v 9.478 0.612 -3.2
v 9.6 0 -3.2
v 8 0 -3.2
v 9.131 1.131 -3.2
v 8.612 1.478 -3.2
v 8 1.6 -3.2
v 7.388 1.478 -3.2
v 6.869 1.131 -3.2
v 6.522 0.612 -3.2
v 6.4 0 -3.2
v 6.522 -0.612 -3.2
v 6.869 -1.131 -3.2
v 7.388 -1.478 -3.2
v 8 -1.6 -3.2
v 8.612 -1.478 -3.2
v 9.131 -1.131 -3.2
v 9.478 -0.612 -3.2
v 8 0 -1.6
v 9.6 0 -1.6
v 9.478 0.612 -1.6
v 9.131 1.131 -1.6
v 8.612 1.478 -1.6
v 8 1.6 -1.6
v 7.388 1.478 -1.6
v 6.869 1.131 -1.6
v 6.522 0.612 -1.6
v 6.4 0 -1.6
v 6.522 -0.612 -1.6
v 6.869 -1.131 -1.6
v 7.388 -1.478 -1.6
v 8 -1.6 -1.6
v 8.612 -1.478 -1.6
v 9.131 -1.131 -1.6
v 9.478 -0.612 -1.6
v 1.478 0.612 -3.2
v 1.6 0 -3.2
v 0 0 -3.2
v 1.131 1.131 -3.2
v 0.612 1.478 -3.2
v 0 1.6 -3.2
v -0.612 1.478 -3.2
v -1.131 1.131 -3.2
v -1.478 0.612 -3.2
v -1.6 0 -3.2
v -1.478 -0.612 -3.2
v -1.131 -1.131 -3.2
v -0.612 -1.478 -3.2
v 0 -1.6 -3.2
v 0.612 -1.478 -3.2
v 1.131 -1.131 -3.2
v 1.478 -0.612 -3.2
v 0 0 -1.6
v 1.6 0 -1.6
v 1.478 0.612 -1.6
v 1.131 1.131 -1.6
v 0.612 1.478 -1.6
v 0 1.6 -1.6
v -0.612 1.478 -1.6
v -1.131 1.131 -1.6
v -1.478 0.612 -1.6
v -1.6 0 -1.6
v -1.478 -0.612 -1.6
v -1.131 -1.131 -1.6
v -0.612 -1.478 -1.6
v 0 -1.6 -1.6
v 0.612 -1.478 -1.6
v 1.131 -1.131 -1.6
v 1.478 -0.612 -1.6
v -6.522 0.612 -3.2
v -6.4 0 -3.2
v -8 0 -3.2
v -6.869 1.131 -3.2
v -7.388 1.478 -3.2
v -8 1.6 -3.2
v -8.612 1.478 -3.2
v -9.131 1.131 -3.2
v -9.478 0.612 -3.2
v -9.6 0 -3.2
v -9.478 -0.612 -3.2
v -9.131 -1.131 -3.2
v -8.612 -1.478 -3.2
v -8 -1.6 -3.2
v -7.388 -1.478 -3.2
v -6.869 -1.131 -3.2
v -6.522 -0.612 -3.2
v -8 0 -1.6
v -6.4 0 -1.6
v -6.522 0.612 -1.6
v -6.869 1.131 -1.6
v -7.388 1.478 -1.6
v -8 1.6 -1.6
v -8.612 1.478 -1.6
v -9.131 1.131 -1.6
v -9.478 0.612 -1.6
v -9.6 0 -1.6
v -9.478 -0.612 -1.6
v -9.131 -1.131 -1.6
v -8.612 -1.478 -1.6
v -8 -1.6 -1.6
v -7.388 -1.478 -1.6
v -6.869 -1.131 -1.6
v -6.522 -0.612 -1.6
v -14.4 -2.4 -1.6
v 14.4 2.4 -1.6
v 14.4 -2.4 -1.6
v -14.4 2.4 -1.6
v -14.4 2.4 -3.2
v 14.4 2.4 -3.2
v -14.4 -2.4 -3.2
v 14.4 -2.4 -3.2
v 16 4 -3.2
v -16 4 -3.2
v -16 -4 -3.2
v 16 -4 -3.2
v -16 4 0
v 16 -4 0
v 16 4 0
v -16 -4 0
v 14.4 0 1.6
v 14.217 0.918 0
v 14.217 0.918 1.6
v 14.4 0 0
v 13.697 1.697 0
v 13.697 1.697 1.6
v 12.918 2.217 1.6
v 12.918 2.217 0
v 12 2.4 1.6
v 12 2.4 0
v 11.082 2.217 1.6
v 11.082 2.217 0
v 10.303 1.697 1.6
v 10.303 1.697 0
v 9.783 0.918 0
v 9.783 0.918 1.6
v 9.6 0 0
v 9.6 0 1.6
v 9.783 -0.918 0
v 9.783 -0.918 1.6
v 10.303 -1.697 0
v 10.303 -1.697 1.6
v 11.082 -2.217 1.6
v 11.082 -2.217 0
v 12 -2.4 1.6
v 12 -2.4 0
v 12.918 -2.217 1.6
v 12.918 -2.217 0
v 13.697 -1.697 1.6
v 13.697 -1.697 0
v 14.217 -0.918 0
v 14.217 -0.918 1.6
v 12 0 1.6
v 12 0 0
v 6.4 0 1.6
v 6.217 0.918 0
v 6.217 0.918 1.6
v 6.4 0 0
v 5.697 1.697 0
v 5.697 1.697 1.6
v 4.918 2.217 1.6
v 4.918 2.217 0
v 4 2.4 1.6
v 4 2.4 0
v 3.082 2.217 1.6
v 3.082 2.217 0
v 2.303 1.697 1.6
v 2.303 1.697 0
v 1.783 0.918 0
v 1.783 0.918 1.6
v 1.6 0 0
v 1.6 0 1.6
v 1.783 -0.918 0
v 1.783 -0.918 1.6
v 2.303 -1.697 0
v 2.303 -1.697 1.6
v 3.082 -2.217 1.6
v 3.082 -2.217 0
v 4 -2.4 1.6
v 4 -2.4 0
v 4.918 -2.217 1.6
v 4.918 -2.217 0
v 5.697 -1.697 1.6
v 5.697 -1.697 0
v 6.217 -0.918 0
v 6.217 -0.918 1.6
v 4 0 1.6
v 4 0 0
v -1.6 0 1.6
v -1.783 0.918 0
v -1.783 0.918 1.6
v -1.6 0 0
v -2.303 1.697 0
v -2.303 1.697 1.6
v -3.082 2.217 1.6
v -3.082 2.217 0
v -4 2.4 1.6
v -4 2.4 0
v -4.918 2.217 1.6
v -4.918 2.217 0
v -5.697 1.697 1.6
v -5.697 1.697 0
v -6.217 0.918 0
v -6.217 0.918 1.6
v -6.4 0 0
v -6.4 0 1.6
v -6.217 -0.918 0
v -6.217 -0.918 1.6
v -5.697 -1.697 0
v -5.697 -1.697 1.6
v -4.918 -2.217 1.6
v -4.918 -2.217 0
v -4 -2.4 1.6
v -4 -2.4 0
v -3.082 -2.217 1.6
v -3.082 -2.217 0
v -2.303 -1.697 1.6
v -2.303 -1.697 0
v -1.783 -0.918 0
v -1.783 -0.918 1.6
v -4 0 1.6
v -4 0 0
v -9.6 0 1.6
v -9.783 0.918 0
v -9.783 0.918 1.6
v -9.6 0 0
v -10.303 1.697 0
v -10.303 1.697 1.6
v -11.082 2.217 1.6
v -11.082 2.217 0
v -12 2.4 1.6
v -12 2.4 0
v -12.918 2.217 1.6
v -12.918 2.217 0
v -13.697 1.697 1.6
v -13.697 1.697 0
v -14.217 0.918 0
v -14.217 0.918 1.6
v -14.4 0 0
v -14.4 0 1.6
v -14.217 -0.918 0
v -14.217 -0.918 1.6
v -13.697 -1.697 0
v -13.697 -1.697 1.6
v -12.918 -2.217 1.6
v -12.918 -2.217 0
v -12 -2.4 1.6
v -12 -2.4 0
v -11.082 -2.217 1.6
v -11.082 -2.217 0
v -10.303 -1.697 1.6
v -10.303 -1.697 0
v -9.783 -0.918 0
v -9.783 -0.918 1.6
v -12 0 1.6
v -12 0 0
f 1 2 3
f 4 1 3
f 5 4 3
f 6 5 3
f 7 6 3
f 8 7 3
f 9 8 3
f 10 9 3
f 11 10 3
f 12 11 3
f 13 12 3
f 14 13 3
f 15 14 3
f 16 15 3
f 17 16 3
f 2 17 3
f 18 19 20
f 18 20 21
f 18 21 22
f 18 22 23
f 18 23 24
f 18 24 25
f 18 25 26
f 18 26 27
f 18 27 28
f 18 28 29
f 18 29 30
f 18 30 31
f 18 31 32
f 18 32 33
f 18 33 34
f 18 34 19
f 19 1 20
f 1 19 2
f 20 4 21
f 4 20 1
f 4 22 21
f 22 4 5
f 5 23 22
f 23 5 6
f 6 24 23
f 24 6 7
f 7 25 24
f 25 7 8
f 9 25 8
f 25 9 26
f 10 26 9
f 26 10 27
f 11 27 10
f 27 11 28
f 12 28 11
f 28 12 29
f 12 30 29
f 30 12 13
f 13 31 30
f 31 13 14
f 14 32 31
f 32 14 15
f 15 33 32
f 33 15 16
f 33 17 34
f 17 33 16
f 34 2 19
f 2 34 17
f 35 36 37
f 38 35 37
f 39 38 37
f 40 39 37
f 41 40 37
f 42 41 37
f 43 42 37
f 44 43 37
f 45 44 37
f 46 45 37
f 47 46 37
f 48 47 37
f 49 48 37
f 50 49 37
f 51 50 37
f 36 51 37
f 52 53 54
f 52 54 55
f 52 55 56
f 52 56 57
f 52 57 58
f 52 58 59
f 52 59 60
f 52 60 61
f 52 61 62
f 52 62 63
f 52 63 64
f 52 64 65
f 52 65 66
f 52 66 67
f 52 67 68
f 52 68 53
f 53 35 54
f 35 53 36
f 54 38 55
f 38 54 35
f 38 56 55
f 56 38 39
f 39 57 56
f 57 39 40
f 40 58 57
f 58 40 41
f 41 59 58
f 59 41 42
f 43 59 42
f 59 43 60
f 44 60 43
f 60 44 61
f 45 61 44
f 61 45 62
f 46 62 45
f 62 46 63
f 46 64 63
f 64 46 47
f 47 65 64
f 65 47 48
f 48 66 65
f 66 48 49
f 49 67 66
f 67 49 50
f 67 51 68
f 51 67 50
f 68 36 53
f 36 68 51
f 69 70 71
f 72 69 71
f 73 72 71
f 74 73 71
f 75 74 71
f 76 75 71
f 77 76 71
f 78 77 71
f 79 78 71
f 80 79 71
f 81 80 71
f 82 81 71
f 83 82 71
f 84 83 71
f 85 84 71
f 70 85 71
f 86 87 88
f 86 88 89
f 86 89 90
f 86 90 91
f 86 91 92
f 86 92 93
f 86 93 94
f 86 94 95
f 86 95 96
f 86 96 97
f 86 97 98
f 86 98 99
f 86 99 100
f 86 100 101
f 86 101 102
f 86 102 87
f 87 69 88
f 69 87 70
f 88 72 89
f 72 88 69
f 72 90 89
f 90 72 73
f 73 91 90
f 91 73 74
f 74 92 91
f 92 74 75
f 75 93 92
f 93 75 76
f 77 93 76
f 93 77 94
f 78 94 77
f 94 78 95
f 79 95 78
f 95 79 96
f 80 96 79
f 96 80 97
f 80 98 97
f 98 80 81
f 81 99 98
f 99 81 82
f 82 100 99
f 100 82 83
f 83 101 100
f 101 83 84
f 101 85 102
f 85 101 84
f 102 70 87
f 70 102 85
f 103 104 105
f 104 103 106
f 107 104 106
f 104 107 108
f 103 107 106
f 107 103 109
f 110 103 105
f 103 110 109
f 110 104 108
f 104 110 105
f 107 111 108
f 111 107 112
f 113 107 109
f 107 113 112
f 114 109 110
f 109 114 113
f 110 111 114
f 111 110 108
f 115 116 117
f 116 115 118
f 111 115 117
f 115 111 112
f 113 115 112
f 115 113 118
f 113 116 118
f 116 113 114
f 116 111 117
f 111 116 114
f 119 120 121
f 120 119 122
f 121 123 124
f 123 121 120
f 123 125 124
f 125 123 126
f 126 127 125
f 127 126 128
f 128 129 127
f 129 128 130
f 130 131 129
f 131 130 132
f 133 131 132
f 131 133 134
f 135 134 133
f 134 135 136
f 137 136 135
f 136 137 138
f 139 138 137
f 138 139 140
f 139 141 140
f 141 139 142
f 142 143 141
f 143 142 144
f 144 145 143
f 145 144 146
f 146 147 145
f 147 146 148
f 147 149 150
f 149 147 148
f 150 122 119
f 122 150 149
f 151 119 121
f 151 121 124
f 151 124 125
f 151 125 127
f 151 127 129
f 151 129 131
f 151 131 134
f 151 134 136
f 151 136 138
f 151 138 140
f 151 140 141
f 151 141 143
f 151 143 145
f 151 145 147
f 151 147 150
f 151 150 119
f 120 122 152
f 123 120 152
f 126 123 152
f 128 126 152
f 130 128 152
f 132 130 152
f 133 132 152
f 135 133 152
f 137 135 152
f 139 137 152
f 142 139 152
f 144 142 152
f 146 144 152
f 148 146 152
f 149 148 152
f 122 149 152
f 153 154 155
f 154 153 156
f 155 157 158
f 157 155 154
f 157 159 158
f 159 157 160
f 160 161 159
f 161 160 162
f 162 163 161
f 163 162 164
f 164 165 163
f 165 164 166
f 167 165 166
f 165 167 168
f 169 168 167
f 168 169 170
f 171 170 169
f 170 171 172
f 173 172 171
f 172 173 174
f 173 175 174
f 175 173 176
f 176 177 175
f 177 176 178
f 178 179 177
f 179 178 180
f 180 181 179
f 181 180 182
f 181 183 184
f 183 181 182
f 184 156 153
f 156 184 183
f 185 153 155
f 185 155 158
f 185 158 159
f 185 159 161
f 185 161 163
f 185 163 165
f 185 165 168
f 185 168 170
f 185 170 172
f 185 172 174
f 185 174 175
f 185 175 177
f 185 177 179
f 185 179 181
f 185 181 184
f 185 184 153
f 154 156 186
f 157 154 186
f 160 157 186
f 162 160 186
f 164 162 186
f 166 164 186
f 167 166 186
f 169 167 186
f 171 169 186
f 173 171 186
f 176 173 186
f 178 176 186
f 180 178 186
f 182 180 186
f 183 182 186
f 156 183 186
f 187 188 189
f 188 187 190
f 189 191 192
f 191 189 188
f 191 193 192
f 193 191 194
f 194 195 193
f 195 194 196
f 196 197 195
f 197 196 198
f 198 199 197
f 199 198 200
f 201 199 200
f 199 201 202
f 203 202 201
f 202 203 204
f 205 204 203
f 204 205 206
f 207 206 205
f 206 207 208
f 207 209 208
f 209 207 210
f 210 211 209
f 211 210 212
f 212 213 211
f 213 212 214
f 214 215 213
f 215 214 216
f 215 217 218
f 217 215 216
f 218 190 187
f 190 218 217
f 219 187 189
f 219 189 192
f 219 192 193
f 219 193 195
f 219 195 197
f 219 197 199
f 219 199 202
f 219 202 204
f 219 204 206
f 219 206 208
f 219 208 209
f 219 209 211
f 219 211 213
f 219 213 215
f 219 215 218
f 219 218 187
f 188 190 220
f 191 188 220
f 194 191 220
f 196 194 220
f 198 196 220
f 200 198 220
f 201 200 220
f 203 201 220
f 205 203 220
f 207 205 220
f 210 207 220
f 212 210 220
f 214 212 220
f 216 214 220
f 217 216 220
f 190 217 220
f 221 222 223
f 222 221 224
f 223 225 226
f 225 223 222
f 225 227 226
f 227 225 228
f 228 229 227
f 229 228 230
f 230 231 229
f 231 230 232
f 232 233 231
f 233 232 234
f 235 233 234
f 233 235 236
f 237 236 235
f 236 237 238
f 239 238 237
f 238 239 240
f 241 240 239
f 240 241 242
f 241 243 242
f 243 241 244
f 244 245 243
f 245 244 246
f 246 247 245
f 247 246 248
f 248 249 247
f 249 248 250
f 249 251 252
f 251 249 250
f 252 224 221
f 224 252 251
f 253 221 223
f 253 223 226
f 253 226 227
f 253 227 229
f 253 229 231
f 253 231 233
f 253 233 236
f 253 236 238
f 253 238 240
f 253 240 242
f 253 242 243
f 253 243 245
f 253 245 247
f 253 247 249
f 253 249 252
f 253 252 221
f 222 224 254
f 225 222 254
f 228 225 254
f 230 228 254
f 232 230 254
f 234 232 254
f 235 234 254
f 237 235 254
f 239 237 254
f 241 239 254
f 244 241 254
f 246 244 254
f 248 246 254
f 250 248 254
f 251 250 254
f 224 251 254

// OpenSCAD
// file: ../p/4-4edge.scad
use <../lib.scad>
function ldraw_lib__4_4edge() = [
// 0 Circle 1.0
// 0 Name: 4-4edge.dat
// 0 Author: James Jessiman
// 0 !LDRAW_ORG Primitive UPDATE 2017-01
// 0 !LICENSE Licensed under CC BY 2.0 and CC BY 4.0 : see CAreadme.txt
// 
// 0 BFC CERTIFY CCW
  [0,"BFC","CERTIFY"],
  [0,"BFC","CCW"],
// 
// 0 !HISTORY 1998-12-15 [PTadmin] Official Update 1998-10
// 0 !HISTORY 2005-12-28 [PTadmin] Official Update 2005-01
// 0 !HISTORY 2007-06-24 [PTadmin] Header formatted for Contributor Agreement
// 0 !HISTORY 2008-07-01 [PTadmin] Official Update 2008-01
// 0 !HISTORY 2017-01-15 [Steffen] BFCed
// 0 !HISTORY 2017-12-30 [PTadmin] Official Update 2017-01
// 
// 
// 2 24 1 0 0 0.9239 0 0.3827
  [2,24,1,0,0,0.9239,0,0.3827],
// 2 24 0.9239 0 0.3827 0.7071 0 0.7071
  [2,24,0.9239,0,0.3827,0.7071,0,0.7071],
// 2 24 0.7071 0 0.7071 0.3827 0 0.9239
  [2,24,0.7071,0,0.7071,0.3827,0,0.9239],
// 2 24 0.3827 0 0.9239 0 0 1
  [2,24,0.3827,0,0.9239,0,0,1],
// 2 24 0 0 1 -0.3827 0 0.9239
  [2,24,0,0,1,-0.3827,0,0.9239],
// 2 24 -0.3827 0 0.9239 -0.7071 0 0.7071
  [2,24,-0.3827,0,0.9239,-0.7071,0,0.7071],
// 2 24 -0.7071 0 0.7071 -0.9239 0 0.3827
  [2,24,-0.7071,0,0.7071,-0.9239,0,0.3827],
// 2 24 -0.9239 0 0.3827 -1 0 -0
  [2,24,-0.9239,0,0.3827,-1,0,-0],
// 2 24 -1 0 -0 -0.9239 0 -0.3827
  [2,24,-1,0,-0,-0.9239,0,-0.3827],
// 2 24 -0.9239 0 -0.3827 -0.7071 0 -0.7071
  [2,24,-0.9239,0,-0.3827,-0.7071,0,-0.7071],
// 2 24 -0.7071 0 -0.7071 -0.3827 0 -0.9239
  [2,24,-0.7071,0,-0.7071,-0.3827,0,-0.9239],
// 2 24 -0.3827 0 -0.9239 0 0 -1
  [2,24,-0.3827,0,-0.9239,0,0,-1],
// 2 24 0 0 -1 0.3827 0 -0.9239
  [2,24,0,0,-1,0.3827,0,-0.9239],
// 2 24 0.3827 0 -0.9239 0.7071 0 -0.7071
  [2,24,0.3827,0,-0.9239,0.7071,0,-0.7071],
// 2 24 0.7071 0 -0.7071 0.9239 0 -0.3827
  [2,24,0.7071,0,-0.7071,0.9239,0,-0.3827],
// 2 24 0.9239 0 -0.3827 1 0 0
  [2,24,0.9239,0,-0.3827,1,0,0],
];
module ldraw_lib__4_4edge(step=0, col=false, unit=2/5, alt=false, line=0.2, solid=!$preview)
    makepoly(ldraw_lib__4_4edge(), step=step, col=col, unit=unit, alt=alt, line=line, solid=solid);
ldraw_lib__4_4edge(line=0.2);
// file: ../p/4-4disc.scad
use <../lib.scad>
function ldraw_lib__4_4disc() = [
// 0 Disc 1.0
// 0 Name: 4-4disc.dat
// 0 Author: James Jessiman
// 0 !LDRAW_ORG Primitive UPDATE 2002-02
// 0 !LICENSE Licensed under CC BY 2.0 and CC BY 4.0 : see CAreadme.txt
// 
// 0 BFC CERTIFY CCW
  [0,"BFC","CERTIFY"],
  [0,"BFC","CCW"],
// 
// 0 !HISTORY 1998-12-15 [PTadmin] Official Update 1998-10
// 0 !HISTORY 2002-03-23 [sbliss] Added BFC statement
// 0 !HISTORY 2002-04-25 [PTadmin] Official Update 2002-02
// 0 !HISTORY 2007-06-24 [PTadmin] Header formatted for Contributor Agreement
// 0 !HISTORY 2008-07-01 [PTadmin] Official Update 2008-01
// 
// 
// 3 16 0 0 0 1 0 0 0.9239 0 0.3827
  [3,16,0,0,0,1,0,0,0.9239,0,0.3827],
// 3 16 0 0 0 0.9239 0 0.3827 0.7071 0 0.7071
  [3,16,0,0,0,0.9239,0,0.3827,0.7071,0,0.7071],
// 3 16 0 0 0 0.7071 0 0.7071 0.3827 0 0.9239
  [3,16,0,0,0,0.7071,0,0.7071,0.3827,0,0.9239],
// 3 16 0 0 0 0.3827 0 0.9239 0 0 1
  [3,16,0,0,0,0.3827,0,0.9239,0,0,1],
// 3 16 0 0 0 0 0 1 -0.3827 0 0.9239
  [3,16,0,0,0,0,0,1,-0.3827,0,0.9239],
// 3 16 0 0 0 -0.3827 0 0.9239 -0.7071 0 0.7071
  [3,16,0,0,0,-0.3827,0,0.9239,-0.7071,0,0.7071],
// 3 16 0 0 0 -0.7071 0 0.7071 -0.9239 0 0.3827
  [3,16,0,0,0,-0.7071,0,0.7071,-0.9239,0,0.3827],
// 3 16 0 0 0 -0.9239 0 0.3827 -1 0 -0
  [3,16,0,0,0,-0.9239,0,0.3827,-1,0,-0],
// 3 16 0 0 0 -1 0 -0 -0.9239 0 -0.3827
  [3,16,0,0,0,-1,0,-0,-0.9239,0,-0.3827],
// 3 16 0 0 0 -0.9239 0 -0.3827 -0.7071 0 -0.7071
  [3,16,0,0,0,-0.9239,0,-0.3827,-0.7071,0,-0.7071],
// 3 16 0 0 0 -0.7071 0 -0.7071 -0.3827 0 -0.9239
  [3,16,0,0,0,-0.7071,0,-0.7071,-0.3827,0,-0.9239],
// 3 16 0 0 0 -0.3827 0 -0.9239 0 0 -1
  [3,16,0,0,0,-0.3827,0,-0.9239,0,0,-1],
// 3 16 0 0 0 0 0 -1 0.3827 0 -0.9239
  [3,16,0,0,0,0,0,-1,0.3827,0,-0.9239],
// 3 16 0 0 0 0.3827 0 -0.9239 0.7071 0 -0.7071
  [3,16,0,0,0,0.3827,0,-0.9239,0.7071,0,-0.7071],
// 3 16 0 0 0 0.7071 0 -0.7071 0.9239 0 -0.3827
  [3,16,0,0,0,0.7071,0,-0.7071,0.9239,0,-0.3827],
// 3 16 0 0 0 0.9239 0 -0.3827 1 0 0
  [3,16,0,0,0,0.9239,0,-0.3827,1,0,0],
// 0
];
module ldraw_lib__4_4disc(step=0, col=false, unit=2/5, alt=false, line=0.2, solid=!$preview)
    makepoly(ldraw_lib__4_4disc(), step=step, col=col, unit=unit, alt=alt, line=line, solid=solid);
ldraw_lib__4_4disc(line=0.2);
// file: ../p/4-4cyli.scad
use <../lib.scad>
function ldraw_lib__4_4cyli() = [
// 0 Cylinder 1.0
// 0 Name: 4-4cyli.dat
// 0 Author: James Jessiman
// 0 !LDRAW_ORG Primitive UPDATE 2005-01
// 0 !LICENSE Licensed under CC BY 4.0 : see CAreadme.txt
// 
// 0 BFC CERTIFY CCW
  [0,"BFC","CERTIFY"],
  [0,"BFC","CCW"],
// 
// 0 !HISTORY 1998-12-15 [PTadmin] Official Update 1998-10
// 0 !HISTORY 2002-03-23 [sbliss] Added BFC statement; merged headers from files in distributions LDraw 0.27 and Complete.
// 0 !HISTORY 2002-04-25 [PTadmin] Official Update 2002-02
// 0 !HISTORY 2004-12-14 [guyvivan] BFC CCW
// 0 !HISTORY 2005-12-28 [PTadmin] Official Update 2005-01
// 0 !HISTORY 2007-06-24 [PTadmin] Header formatted for Contributor Agreement
// 0 !HISTORY 2008-07-01 [PTadmin] Official Update 2008-01
// 
// 
// 4 16 1 1 0 0.9239 1 0.3827 0.9239 0 0.3827 1 0 0
  [4,16,1,1,0,0.9239,1,0.3827,0.9239,0,0.3827,1,0,0],
// 5 24 1 0 0 1 1 0 0.9239 0 0.3827 0.9239 0 -0.3827
  [5,24,1,0,0,1,1,0,0.9239,0,0.3827,0.9239,0,-0.3827],
// 4 16 0.9239 1 0.3827 0.7071 1 0.7071 0.7071 0 0.7071 0.9239 0 0.3827
  [4,16,0.9239,1,0.3827,0.7071,1,0.7071,0.7071,0,0.7071,0.9239,0,0.3827],
// 5 24 0.9239 0 0.3827 0.9239 1 0.3827 0.7071 0 0.7071 1 0 0
  [5,24,0.9239,0,0.3827,0.9239,1,0.3827,0.7071,0,0.7071,1,0,0],
// 4 16 0.7071 1 0.7071 0.3827 1 0.9239 0.3827 0 0.9239 0.7071 0 0.7071
  [4,16,0.7071,1,0.7071,0.3827,1,0.9239,0.3827,0,0.9239,0.7071,0,0.7071],
// 5 24 0.7071 0 0.7071 0.7071 1 0.7071 0.3827 0 0.9239 0.9239 0 0.3827
  [5,24,0.7071,0,0.7071,0.7071,1,0.7071,0.3827,0,0.9239,0.9239,0,0.3827],
// 4 16 0.3827 1 0.9239 0 1 1 0 0 1 0.3827 0 0.9239
  [4,16,0.3827,1,0.9239,0,1,1,0,0,1,0.3827,0,0.9239],
// 5 24 0.3827 0 0.9239 0.3827 1 0.9239 0 0 1 0.7071 0 0.7071
  [5,24,0.3827,0,0.9239,0.3827,1,0.9239,0,0,1,0.7071,0,0.7071],
// 4 16 0 1 1 -0.3827 1 0.9239 -0.3827 0 0.9239 0 0 1
  [4,16,0,1,1,-0.3827,1,0.9239,-0.3827,0,0.9239,0,0,1],
// 5 24 0 0 1 0 1 1 -0.3827 0 0.9239 0.3827 0 0.9239
  [5,24,0,0,1,0,1,1,-0.3827,0,0.9239,0.3827,0,0.9239],
// 4 16 -0.3827 1 0.9239 -0.7071 1 0.7071 -0.7071 0 0.7071 -0.3827 0 0.9239
  [4,16,-0.3827,1,0.9239,-0.7071,1,0.7071,-0.7071,0,0.7071,-0.3827,0,0.9239],
// 5 24 -0.3827 0 0.9239 -0.3827 1 0.9239 -0.7071 0 0.7071 0 0 1
  [5,24,-0.3827,0,0.9239,-0.3827,1,0.9239,-0.7071,0,0.7071,0,0,1],
// 4 16 -0.7071 1 0.7071 -0.9239 1 0.3827 -0.9239 0 0.3827 -0.7071 0 0.7071
  [4,16,-0.7071,1,0.7071,-0.9239,1,0.3827,-0.9239,0,0.3827,-0.7071,0,0.7071],
// 5 24 -0.7071 0 0.7071 -0.7071 1 0.7071 -0.9239 0 0.3827 -0.3827 0 0.9239
  [5,24,-0.7071,0,0.7071,-0.7071,1,0.7071,-0.9239,0,0.3827,-0.3827,0,0.9239],
// 4 16 -0.9239 1 0.3827 -1 1 0 -1 0 0 -0.9239 0 0.3827
  [4,16,-0.9239,1,0.3827,-1,1,0,-1,0,0,-0.9239,0,0.3827],
// 5 24 -0.9239 0 0.3827 -0.9239 1 0.3827 -1 0 0 -0.7071 0 0.7071
  [5,24,-0.9239,0,0.3827,-0.9239,1,0.3827,-1,0,0,-0.7071,0,0.7071],
// 4 16 -1 1 0 -0.9239 1 -0.3827 -0.9239 0 -0.3827 -1 0 0
  [4,16,-1,1,0,-0.9239,1,-0.3827,-0.9239,0,-0.3827,-1,0,0],
// 5 24 -1 0 0 -1 1 0 -0.9239 0 -0.3827 -0.9239 0 0.3827
  [5,24,-1,0,0,-1,1,0,-0.9239,0,-0.3827,-0.9239,0,0.3827],
// 4 16 -0.9239 1 -0.3827 -0.7071 1 -0.7071 -0.7071 0 -0.7071 -0.9239 0 -0.3827
  [4,16,-0.9239,1,-0.3827,-0.7071,1,-0.7071,-0.7071,0,-0.7071,-0.9239,0,-0.3827],
// 5 24 -0.9239 0 -0.3827 -0.9239 1 -0.3827 -0.7071 0 -0.7071 -1 0 0
  [5,24,-0.9239,0,-0.3827,-0.9239,1,-0.3827,-0.7071,0,-0.7071,-1,0,0],
// 4 16 -0.7071 1 -0.7071 -0.3827 1 -0.9239 -0.3827 0 -0.9239 -0.7071 0 -0.7071
  [4,16,-0.7071,1,-0.7071,-0.3827,1,-0.9239,-0.3827,0,-0.9239,-0.7071,0,-0.7071],
// 5 24 -0.7071 0 -0.7071 -0.7071 1 -0.7071 -0.3827 0 -0.9239 -0.9239 0 -0.3827
  [5,24,-0.7071,0,-0.7071,-0.7071,1,-0.7071,-0.3827,0,-0.9239,-0.9239,0,-0.3827],
// 4 16 -0.3827 1 -0.9239 0 1 -1 0 0 -1 -0.3827 0 -0.9239
  [4,16,-0.3827,1,-0.9239,0,1,-1,0,0,-1,-0.3827,0,-0.9239],
// 5 24 -0.3827 0 -0.9239 -0.3827 1 -0.9239 0 0 -1 -0.7071 0 -0.7071
  [5,24,-0.3827,0,-0.9239,-0.3827,1,-0.9239,0,0,-1,-0.7071,0,-0.7071],
// 4 16 0 1 -1 0.3827 1 -0.9239 0.3827 0 -0.9239 0 0 -1
  [4,16,0,1,-1,0.3827,1,-0.9239,0.3827,0,-0.9239,0,0,-1],
// 5 24 0 0 -1 0 1 -1 0.3827 0 -0.9239 -0.3827 0 -0.9239
  [5,24,0,0,-1,0,1,-1,0.3827,0,-0.9239,-0.3827,0,-0.9239],
// 4 16 0.3827 1 -0.9239 0.7071 1 -0.7071 0.7071 0 -0.7071 0.3827 0 -0.9239
  [4,16,0.3827,1,-0.9239,0.7071,1,-0.7071,0.7071,0,-0.7071,0.3827,0,-0.9239],
// 5 24 0.3827 0 -0.9239 0.3827 1 -0.9239 0.7071 0 -0.7071 0 0 -1
  [5,24,0.3827,0,-0.9239,0.3827,1,-0.9239,0.7071,0,-0.7071,0,0,-1],
// 4 16 0.7071 1 -0.7071 0.9239 1 -0.3827 0.9239 0 -0.3827 0.7071 0 -0.7071
  [4,16,0.7071,1,-0.7071,0.9239,1,-0.3827,0.9239,0,-0.3827,0.7071,0,-0.7071],
// 5 24 0.7071 0 -0.7071 0.7071 1 -0.7071 0.9239 0 -0.3827 0.3827 0 -0.9239
  [5,24,0.7071,0,-0.7071,0.7071,1,-0.7071,0.9239,0,-0.3827,0.3827,0,-0.9239],
// 4 16 0.9239 1 -0.3827 1 1 0 1 0 0 0.9239 0 -0.3827
  [4,16,0.9239,1,-0.3827,1,1,0,1,0,0,0.9239,0,-0.3827],
// 5 24 0.9239 0 -0.3827 0.9239 1 -0.3827 1 0 0 0.7071 0 -0.7071
  [5,24,0.9239,0,-0.3827,0.9239,1,-0.3827,1,0,0,0.7071,0,-0.7071],
// 0
];
module ldraw_lib__4_4cyli(step=0, col=false, unit=2/5, alt=false, line=0.2, solid=!$preview)
    makepoly(ldraw_lib__4_4cyli(), step=step, col=col, unit=unit, alt=alt, line=line, solid=solid);
ldraw_lib__4_4cyli(line=0.2);
// file: ../p/stud3.scad
use <../lib.scad>
use <4-4cyli.scad>
use <4-4disc.scad>
use <4-4edge.scad>
function ldraw_lib__stud3() = [
// 0 Stud Tube Solid
// 0 Name: stud3.dat
// 0 Author: James Jessiman
// 0 !LDRAW_ORG Primitive UPDATE 2012-01
// 0 !LICENSE Licensed under CC BY 4.0 : see CAreadme.txt
// 
// 0 BFC CERTIFY CCW
  [0,"BFC","CERTIFY"],
  [0,"BFC","CCW"],
// 
// 0 !HISTORY 2002-04-04 [sbliss] Modified for BFC compliance
// 0 !HISTORY 2002-04-25 [PTadmin] Official Update 2002-02
// 0 !HISTORY 2007-06-24 [PTadmin] Header formatted for Contributor Agreement
// 0 !HISTORY 2008-07-01 [PTadmin] Official Update 2008-01
// 0 !HISTORY 2012-02-16 [Philo] Changed to CCW
// 0 !HISTORY 2012-03-30 [PTadmin] Official Update 2012-01
// 
// 
// 1 16 0 -4 0 4 0 0 0 1 0 0 0 4 4-4edge.dat
  [1,16,0,-4,0,4,0,0,0,1,0,0,0,4, ldraw_lib__4_4edge()],
// 1 16 0 0 0 4 0 0 0 1 0 0 0 4 4-4edge.dat
  [1,16,0,0,0,4,0,0,0,1,0,0,0,4, ldraw_lib__4_4edge()],
// 1 16 0 -4 0 4 0 0 0 1 0 0 0 4 4-4disc.dat
  [1,16,0,-4,0,4,0,0,0,1,0,0,0,4, ldraw_lib__4_4disc()],
  [-1,16,0,0,0,4,0,0,0,-1,0,0,0,4, ldraw_lib__4_4disc()],
// 1 16 0 -4 0 4 0 0 0 4 0 0 0 4 4-4cyli.dat
  [1,16,0,-4,0,4,0,0,0,4,0,0,0,4, ldraw_lib__4_4cyli()],
];
module ldraw_lib__stud3(step=0, col=false, unit=2/5, alt=false, line=0.2, solid=!$preview)
    makepoly(ldraw_lib__stud3(), step=step, col=col, unit=unit, alt=alt, line=line, solid=solid);
ldraw_lib__stud3(line=0.2);
// file: ../p/stud.scad
use <../lib.scad>
use <4-4cyli.scad>
use <4-4disc.scad>
use <4-4edge.scad>
function ldraw_lib__stud() = [
// 0 Stud
// 0 Name: stud.dat
// 0 Author: James Jessiman
// 0 !LDRAW_ORG Primitive UPDATE 2012-01
// 0 !LICENSE Licensed under CC BY 4.0 : see CAreadme.txt
// 
// 0 BFC CERTIFY CCW
  [0,"BFC","CERTIFY"],
  [0,"BFC","CCW"],
// 
// 0 !HISTORY 2002-04-04 [sbliss] Modified for BFC compliance
// 0 !HISTORY 2002-04-25 [PTadmin] Official Update 2002-02
// 0 !HISTORY 2007-06-24 [PTadmin] Header formatted for Contributor Agreement
// 0 !HISTORY 2008-07-01 [PTadmin] Official Update 2008-01
// 0 !HISTORY 2012-02-16 [Philo] Changed to CCW
// 0 !HISTORY 2012-03-30 [PTadmin] Official Update 2012-01
// 
// 
// 1 16 0 0 0 6 0 0 0 1 0 0 0 6 4-4edge.dat
  [1,16,0,0,0,6,0,0,0,1,0,0,0,6, ldraw_lib__4_4edge()],
// 1 16 0 -4 0 6 0 0 0 1 0 0 0 6 4-4edge.dat
  [1,16,0,-4,0,6,0,0,0,1,0,0,0,6, ldraw_lib__4_4edge()],
// 1 16 0 0 0 6 0 0 0 -4 0 0 0 6 4-4cyli.dat
  [1,16,0,0,0,6,0,0,0,-4,0,0,0,6, ldraw_lib__4_4cyli()],
// 1 16 0 -4 0 6 0 0 0 1 0 0 0 6 4-4disc.dat
  [1,16,0,-4,0,6,0,0,0,1,0,0,0,6, ldraw_lib__4_4disc()],
  [-1,16,0,0,0,6,0,0,0,-1,0,0,0,6, ldraw_lib__4_4disc()],
];
module ldraw_lib__stud(step=0, col=false, unit=2/5, alt=false, line=0.2, solid=!$preview)
    makepoly(ldraw_lib__stud(), step=step, col=col, unit=unit, alt=alt, line=line, solid=solid);
ldraw_lib__stud(line=0.2);
// file: ../p/box5.scad
use <../lib.scad>
function ldraw_lib__box5() = [
// 0 Box with 5 Faces and All Edges
// 0 Name: box5.dat
// 0 Author: James Jessiman
// 0 !LDRAW_ORG Primitive UPDATE 2012-01
// 0 !LICENSE Licensed under CC BY 2.0 and CC BY 4.0 : see CAreadme.txt
// 
// 0 BFC CERTIFY CCW
  [0,"BFC","CERTIFY"],
  [0,"BFC","CCW"],
// 
// 0 !HISTORY 2002-04-03 [sbliss] Modified for BFC compliance
// 0 !HISTORY 2002-04-25 [PTadmin] Official Update 2002-02
// 0 !HISTORY 2007-06-24 [PTadmin] Header formatted for Contributor Agreement
// 0 !HISTORY 2008-07-01 [PTadmin] Official Update 2008-01
// 0 !HISTORY 2012-02-16 [Philo] Changed to CCW
// 0 !HISTORY 2012-03-30 [PTadmin] Official Update 2012-01
// 
// 
// 2 24 1 1 1 -1 1 1
  [2,24,1,1,1,-1,1,1],
// 2 24 -1 1 1 -1 1 -1
  [2,24,-1,1,1,-1,1,-1],
// 2 24 -1 1 -1 1 1 -1
  [2,24,-1,1,-1,1,1,-1],
// 2 24 1 1 -1 1 1 1
  [2,24,1,1,-1,1,1,1],
// 2 24 1 0 1 -1 0 1
  [2,24,1,0,1,-1,0,1],
// 2 24 -1 0 1 -1 0 -1
  [2,24,-1,0,1,-1,0,-1],
// 2 24 -1 0 -1 1 0 -1
  [2,24,-1,0,-1,1,0,-1],
// 2 24 1 0 -1 1 0 1
  [2,24,1,0,-1,1,0,1],
// 2 24 1 0 1 1 1 1
  [2,24,1,0,1,1,1,1],
// 2 24 -1 0 1 -1 1 1
  [2,24,-1,0,1,-1,1,1],
// 2 24 1 0 -1 1 1 -1
  [2,24,1,0,-1,1,1,-1],
// 2 24 -1 0 -1 -1 1 -1
  [2,24,-1,0,-1,-1,1,-1],
// 4 16 -1 1 1 1 1 1 1 1 -1 -1 1 -1
  [4,16,-1,1,1,1,1,1,1,1,-1,-1,1,-1],
// 4 16 -1 1 1 -1 0 1 1 0 1 1 1 1
  [4,16,-1,1,1,-1,0,1,1,0,1,1,1,1],
// 4 16 -1 1 -1 -1 0 -1 -1 0 1 -1 1 1
  [4,16,-1,1,-1,-1,0,-1,-1,0,1,-1,1,1],
// 4 16 1 1 -1 1 0 -1 -1 0 -1 -1 1 -1
  [4,16,1,1,-1,1,0,-1,-1,0,-1,-1,1,-1],
// 4 16 1 1 1 1 0 1 1 0 -1 1 1 -1
  [4,16,1,1,1,1,0,1,1,0,-1,1,1,-1],
];
makepoly(ldraw_lib__box5(), line=0.2);
// main file
use <../lib.scad>
use <../p/box5.scad>
use <../p/stud.scad>
use <../p/stud3.scad>
function ldraw_lib__3710() = [
// 0 Plate  1 x  4
// 0 Name: 3710.dat
// 0 Author: James Jessiman
// 0 !LDRAW_ORG Part UPDATE 2004-04
// 0 !LICENSE Licensed under CC BY 4.0 : see CAreadme.txt
// 
// 0 BFC CERTIFY CCW
  [0,"BFC","CERTIFY"],
  [0,"BFC","CCW"],
// 
// 0 !HISTORY 2004-07-25 [guyvivan] Made BFC Compliant
// 0 !HISTORY 2004-11-06 [PTadmin] Official Update 2004-04
// 0 !HISTORY 2007-06-29 [PTadmin] Header formatted for Contributor Agreement
// 0 !HISTORY 2008-07-01 [PTadmin] Official Update 2008-01
// 
// 
// 1 16 20 4 0 1 0 0 0 -1 0 0 0 1 stud3.dat
  [1,16,20,4,0,1,0,0,0,-1,0,0,0,1, ldraw_lib__stud3()],
// 1 16 0 4 0 1 0 0 0 -1 0 0 0 1 stud3.dat
  [1,16,0,4,0,1,0,0,0,-1,0,0,0,1, ldraw_lib__stud3()],
// 1 16 -20 4 0 1 0 0 0 -1 0 0 0 1 stud3.dat
  [1,16,-20,4,0,1,0,0,0,-1,0,0,0,1, ldraw_lib__stud3()],
// 0 BFC INVERTNEXT
  [0,"BFC","INVERTNEXT"],
// 1 16 0 8 0 36 0 0 0 -4 0 0 0 6 box5.dat
  [1,16,0,8,0,36,0,0,0,-4,0,0,0,6, ldraw_lib__box5()],
// 4 16 40 8 10 36 8 6 -36 8 6 -40 8 10
  [4,16,40,8,10,36,8,6,-36,8,6,-40,8,10],
// 4 16 -40 8 10 -36 8 6 -36 8 -6 -40 8 -10
  [4,16,-40,8,10,-36,8,6,-36,8,-6,-40,8,-10],
// 4 16 -40 8 -10 -36 8 -6 36 8 -6 40 8 -10
  [4,16,-40,8,-10,-36,8,-6,36,8,-6,40,8,-10],
// 4 16 40 8 -10 36 8 -6 36 8 6 40 8 10
  [4,16,40,8,-10,36,8,-6,36,8,6,40,8,10],
// 1 16 0 8 0 40 0 0 0 -8 0 0 0 10 box5.dat
  [1,16,0,8,0,40,0,0,0,-8,0,0,0,10, ldraw_lib__box5()],
// 1 16 30 0 0 1 0 0 0 1 0 0 0 1 stud.dat
  [1,16,30,0,0,1,0,0,0,1,0,0,0,1, ldraw_lib__stud()],
// 1 16 10 0 0 1 0 0 0 1 0 0 0 1 stud.dat
  [1,16,10,0,0,1,0,0,0,1,0,0,0,1, ldraw_lib__stud()],
// 1 16 -10 0 0 1 0 0 0 1 0 0 0 1 stud.dat
  [1,16,-10,0,0,1,0,0,0,1,0,0,0,1, ldraw_lib__stud()],
// 1 16 -30 0 0 1 0 0 0 1 0 0 0 1 stud.dat
  [1,16,-30,0,0,1,0,0,0,1,0,0,0,1, ldraw_lib__stud()],
// 0
// 
];
module ldraw_lib__3710(step=0, col=false, unit=2/5, alt=false, line=0.2, solid=!$preview)
    makepoly(ldraw_lib__3710(), step=step, col=col, unit=unit, alt=alt, line=line, solid=solid);
ldraw_lib__3710(line=0.2);
